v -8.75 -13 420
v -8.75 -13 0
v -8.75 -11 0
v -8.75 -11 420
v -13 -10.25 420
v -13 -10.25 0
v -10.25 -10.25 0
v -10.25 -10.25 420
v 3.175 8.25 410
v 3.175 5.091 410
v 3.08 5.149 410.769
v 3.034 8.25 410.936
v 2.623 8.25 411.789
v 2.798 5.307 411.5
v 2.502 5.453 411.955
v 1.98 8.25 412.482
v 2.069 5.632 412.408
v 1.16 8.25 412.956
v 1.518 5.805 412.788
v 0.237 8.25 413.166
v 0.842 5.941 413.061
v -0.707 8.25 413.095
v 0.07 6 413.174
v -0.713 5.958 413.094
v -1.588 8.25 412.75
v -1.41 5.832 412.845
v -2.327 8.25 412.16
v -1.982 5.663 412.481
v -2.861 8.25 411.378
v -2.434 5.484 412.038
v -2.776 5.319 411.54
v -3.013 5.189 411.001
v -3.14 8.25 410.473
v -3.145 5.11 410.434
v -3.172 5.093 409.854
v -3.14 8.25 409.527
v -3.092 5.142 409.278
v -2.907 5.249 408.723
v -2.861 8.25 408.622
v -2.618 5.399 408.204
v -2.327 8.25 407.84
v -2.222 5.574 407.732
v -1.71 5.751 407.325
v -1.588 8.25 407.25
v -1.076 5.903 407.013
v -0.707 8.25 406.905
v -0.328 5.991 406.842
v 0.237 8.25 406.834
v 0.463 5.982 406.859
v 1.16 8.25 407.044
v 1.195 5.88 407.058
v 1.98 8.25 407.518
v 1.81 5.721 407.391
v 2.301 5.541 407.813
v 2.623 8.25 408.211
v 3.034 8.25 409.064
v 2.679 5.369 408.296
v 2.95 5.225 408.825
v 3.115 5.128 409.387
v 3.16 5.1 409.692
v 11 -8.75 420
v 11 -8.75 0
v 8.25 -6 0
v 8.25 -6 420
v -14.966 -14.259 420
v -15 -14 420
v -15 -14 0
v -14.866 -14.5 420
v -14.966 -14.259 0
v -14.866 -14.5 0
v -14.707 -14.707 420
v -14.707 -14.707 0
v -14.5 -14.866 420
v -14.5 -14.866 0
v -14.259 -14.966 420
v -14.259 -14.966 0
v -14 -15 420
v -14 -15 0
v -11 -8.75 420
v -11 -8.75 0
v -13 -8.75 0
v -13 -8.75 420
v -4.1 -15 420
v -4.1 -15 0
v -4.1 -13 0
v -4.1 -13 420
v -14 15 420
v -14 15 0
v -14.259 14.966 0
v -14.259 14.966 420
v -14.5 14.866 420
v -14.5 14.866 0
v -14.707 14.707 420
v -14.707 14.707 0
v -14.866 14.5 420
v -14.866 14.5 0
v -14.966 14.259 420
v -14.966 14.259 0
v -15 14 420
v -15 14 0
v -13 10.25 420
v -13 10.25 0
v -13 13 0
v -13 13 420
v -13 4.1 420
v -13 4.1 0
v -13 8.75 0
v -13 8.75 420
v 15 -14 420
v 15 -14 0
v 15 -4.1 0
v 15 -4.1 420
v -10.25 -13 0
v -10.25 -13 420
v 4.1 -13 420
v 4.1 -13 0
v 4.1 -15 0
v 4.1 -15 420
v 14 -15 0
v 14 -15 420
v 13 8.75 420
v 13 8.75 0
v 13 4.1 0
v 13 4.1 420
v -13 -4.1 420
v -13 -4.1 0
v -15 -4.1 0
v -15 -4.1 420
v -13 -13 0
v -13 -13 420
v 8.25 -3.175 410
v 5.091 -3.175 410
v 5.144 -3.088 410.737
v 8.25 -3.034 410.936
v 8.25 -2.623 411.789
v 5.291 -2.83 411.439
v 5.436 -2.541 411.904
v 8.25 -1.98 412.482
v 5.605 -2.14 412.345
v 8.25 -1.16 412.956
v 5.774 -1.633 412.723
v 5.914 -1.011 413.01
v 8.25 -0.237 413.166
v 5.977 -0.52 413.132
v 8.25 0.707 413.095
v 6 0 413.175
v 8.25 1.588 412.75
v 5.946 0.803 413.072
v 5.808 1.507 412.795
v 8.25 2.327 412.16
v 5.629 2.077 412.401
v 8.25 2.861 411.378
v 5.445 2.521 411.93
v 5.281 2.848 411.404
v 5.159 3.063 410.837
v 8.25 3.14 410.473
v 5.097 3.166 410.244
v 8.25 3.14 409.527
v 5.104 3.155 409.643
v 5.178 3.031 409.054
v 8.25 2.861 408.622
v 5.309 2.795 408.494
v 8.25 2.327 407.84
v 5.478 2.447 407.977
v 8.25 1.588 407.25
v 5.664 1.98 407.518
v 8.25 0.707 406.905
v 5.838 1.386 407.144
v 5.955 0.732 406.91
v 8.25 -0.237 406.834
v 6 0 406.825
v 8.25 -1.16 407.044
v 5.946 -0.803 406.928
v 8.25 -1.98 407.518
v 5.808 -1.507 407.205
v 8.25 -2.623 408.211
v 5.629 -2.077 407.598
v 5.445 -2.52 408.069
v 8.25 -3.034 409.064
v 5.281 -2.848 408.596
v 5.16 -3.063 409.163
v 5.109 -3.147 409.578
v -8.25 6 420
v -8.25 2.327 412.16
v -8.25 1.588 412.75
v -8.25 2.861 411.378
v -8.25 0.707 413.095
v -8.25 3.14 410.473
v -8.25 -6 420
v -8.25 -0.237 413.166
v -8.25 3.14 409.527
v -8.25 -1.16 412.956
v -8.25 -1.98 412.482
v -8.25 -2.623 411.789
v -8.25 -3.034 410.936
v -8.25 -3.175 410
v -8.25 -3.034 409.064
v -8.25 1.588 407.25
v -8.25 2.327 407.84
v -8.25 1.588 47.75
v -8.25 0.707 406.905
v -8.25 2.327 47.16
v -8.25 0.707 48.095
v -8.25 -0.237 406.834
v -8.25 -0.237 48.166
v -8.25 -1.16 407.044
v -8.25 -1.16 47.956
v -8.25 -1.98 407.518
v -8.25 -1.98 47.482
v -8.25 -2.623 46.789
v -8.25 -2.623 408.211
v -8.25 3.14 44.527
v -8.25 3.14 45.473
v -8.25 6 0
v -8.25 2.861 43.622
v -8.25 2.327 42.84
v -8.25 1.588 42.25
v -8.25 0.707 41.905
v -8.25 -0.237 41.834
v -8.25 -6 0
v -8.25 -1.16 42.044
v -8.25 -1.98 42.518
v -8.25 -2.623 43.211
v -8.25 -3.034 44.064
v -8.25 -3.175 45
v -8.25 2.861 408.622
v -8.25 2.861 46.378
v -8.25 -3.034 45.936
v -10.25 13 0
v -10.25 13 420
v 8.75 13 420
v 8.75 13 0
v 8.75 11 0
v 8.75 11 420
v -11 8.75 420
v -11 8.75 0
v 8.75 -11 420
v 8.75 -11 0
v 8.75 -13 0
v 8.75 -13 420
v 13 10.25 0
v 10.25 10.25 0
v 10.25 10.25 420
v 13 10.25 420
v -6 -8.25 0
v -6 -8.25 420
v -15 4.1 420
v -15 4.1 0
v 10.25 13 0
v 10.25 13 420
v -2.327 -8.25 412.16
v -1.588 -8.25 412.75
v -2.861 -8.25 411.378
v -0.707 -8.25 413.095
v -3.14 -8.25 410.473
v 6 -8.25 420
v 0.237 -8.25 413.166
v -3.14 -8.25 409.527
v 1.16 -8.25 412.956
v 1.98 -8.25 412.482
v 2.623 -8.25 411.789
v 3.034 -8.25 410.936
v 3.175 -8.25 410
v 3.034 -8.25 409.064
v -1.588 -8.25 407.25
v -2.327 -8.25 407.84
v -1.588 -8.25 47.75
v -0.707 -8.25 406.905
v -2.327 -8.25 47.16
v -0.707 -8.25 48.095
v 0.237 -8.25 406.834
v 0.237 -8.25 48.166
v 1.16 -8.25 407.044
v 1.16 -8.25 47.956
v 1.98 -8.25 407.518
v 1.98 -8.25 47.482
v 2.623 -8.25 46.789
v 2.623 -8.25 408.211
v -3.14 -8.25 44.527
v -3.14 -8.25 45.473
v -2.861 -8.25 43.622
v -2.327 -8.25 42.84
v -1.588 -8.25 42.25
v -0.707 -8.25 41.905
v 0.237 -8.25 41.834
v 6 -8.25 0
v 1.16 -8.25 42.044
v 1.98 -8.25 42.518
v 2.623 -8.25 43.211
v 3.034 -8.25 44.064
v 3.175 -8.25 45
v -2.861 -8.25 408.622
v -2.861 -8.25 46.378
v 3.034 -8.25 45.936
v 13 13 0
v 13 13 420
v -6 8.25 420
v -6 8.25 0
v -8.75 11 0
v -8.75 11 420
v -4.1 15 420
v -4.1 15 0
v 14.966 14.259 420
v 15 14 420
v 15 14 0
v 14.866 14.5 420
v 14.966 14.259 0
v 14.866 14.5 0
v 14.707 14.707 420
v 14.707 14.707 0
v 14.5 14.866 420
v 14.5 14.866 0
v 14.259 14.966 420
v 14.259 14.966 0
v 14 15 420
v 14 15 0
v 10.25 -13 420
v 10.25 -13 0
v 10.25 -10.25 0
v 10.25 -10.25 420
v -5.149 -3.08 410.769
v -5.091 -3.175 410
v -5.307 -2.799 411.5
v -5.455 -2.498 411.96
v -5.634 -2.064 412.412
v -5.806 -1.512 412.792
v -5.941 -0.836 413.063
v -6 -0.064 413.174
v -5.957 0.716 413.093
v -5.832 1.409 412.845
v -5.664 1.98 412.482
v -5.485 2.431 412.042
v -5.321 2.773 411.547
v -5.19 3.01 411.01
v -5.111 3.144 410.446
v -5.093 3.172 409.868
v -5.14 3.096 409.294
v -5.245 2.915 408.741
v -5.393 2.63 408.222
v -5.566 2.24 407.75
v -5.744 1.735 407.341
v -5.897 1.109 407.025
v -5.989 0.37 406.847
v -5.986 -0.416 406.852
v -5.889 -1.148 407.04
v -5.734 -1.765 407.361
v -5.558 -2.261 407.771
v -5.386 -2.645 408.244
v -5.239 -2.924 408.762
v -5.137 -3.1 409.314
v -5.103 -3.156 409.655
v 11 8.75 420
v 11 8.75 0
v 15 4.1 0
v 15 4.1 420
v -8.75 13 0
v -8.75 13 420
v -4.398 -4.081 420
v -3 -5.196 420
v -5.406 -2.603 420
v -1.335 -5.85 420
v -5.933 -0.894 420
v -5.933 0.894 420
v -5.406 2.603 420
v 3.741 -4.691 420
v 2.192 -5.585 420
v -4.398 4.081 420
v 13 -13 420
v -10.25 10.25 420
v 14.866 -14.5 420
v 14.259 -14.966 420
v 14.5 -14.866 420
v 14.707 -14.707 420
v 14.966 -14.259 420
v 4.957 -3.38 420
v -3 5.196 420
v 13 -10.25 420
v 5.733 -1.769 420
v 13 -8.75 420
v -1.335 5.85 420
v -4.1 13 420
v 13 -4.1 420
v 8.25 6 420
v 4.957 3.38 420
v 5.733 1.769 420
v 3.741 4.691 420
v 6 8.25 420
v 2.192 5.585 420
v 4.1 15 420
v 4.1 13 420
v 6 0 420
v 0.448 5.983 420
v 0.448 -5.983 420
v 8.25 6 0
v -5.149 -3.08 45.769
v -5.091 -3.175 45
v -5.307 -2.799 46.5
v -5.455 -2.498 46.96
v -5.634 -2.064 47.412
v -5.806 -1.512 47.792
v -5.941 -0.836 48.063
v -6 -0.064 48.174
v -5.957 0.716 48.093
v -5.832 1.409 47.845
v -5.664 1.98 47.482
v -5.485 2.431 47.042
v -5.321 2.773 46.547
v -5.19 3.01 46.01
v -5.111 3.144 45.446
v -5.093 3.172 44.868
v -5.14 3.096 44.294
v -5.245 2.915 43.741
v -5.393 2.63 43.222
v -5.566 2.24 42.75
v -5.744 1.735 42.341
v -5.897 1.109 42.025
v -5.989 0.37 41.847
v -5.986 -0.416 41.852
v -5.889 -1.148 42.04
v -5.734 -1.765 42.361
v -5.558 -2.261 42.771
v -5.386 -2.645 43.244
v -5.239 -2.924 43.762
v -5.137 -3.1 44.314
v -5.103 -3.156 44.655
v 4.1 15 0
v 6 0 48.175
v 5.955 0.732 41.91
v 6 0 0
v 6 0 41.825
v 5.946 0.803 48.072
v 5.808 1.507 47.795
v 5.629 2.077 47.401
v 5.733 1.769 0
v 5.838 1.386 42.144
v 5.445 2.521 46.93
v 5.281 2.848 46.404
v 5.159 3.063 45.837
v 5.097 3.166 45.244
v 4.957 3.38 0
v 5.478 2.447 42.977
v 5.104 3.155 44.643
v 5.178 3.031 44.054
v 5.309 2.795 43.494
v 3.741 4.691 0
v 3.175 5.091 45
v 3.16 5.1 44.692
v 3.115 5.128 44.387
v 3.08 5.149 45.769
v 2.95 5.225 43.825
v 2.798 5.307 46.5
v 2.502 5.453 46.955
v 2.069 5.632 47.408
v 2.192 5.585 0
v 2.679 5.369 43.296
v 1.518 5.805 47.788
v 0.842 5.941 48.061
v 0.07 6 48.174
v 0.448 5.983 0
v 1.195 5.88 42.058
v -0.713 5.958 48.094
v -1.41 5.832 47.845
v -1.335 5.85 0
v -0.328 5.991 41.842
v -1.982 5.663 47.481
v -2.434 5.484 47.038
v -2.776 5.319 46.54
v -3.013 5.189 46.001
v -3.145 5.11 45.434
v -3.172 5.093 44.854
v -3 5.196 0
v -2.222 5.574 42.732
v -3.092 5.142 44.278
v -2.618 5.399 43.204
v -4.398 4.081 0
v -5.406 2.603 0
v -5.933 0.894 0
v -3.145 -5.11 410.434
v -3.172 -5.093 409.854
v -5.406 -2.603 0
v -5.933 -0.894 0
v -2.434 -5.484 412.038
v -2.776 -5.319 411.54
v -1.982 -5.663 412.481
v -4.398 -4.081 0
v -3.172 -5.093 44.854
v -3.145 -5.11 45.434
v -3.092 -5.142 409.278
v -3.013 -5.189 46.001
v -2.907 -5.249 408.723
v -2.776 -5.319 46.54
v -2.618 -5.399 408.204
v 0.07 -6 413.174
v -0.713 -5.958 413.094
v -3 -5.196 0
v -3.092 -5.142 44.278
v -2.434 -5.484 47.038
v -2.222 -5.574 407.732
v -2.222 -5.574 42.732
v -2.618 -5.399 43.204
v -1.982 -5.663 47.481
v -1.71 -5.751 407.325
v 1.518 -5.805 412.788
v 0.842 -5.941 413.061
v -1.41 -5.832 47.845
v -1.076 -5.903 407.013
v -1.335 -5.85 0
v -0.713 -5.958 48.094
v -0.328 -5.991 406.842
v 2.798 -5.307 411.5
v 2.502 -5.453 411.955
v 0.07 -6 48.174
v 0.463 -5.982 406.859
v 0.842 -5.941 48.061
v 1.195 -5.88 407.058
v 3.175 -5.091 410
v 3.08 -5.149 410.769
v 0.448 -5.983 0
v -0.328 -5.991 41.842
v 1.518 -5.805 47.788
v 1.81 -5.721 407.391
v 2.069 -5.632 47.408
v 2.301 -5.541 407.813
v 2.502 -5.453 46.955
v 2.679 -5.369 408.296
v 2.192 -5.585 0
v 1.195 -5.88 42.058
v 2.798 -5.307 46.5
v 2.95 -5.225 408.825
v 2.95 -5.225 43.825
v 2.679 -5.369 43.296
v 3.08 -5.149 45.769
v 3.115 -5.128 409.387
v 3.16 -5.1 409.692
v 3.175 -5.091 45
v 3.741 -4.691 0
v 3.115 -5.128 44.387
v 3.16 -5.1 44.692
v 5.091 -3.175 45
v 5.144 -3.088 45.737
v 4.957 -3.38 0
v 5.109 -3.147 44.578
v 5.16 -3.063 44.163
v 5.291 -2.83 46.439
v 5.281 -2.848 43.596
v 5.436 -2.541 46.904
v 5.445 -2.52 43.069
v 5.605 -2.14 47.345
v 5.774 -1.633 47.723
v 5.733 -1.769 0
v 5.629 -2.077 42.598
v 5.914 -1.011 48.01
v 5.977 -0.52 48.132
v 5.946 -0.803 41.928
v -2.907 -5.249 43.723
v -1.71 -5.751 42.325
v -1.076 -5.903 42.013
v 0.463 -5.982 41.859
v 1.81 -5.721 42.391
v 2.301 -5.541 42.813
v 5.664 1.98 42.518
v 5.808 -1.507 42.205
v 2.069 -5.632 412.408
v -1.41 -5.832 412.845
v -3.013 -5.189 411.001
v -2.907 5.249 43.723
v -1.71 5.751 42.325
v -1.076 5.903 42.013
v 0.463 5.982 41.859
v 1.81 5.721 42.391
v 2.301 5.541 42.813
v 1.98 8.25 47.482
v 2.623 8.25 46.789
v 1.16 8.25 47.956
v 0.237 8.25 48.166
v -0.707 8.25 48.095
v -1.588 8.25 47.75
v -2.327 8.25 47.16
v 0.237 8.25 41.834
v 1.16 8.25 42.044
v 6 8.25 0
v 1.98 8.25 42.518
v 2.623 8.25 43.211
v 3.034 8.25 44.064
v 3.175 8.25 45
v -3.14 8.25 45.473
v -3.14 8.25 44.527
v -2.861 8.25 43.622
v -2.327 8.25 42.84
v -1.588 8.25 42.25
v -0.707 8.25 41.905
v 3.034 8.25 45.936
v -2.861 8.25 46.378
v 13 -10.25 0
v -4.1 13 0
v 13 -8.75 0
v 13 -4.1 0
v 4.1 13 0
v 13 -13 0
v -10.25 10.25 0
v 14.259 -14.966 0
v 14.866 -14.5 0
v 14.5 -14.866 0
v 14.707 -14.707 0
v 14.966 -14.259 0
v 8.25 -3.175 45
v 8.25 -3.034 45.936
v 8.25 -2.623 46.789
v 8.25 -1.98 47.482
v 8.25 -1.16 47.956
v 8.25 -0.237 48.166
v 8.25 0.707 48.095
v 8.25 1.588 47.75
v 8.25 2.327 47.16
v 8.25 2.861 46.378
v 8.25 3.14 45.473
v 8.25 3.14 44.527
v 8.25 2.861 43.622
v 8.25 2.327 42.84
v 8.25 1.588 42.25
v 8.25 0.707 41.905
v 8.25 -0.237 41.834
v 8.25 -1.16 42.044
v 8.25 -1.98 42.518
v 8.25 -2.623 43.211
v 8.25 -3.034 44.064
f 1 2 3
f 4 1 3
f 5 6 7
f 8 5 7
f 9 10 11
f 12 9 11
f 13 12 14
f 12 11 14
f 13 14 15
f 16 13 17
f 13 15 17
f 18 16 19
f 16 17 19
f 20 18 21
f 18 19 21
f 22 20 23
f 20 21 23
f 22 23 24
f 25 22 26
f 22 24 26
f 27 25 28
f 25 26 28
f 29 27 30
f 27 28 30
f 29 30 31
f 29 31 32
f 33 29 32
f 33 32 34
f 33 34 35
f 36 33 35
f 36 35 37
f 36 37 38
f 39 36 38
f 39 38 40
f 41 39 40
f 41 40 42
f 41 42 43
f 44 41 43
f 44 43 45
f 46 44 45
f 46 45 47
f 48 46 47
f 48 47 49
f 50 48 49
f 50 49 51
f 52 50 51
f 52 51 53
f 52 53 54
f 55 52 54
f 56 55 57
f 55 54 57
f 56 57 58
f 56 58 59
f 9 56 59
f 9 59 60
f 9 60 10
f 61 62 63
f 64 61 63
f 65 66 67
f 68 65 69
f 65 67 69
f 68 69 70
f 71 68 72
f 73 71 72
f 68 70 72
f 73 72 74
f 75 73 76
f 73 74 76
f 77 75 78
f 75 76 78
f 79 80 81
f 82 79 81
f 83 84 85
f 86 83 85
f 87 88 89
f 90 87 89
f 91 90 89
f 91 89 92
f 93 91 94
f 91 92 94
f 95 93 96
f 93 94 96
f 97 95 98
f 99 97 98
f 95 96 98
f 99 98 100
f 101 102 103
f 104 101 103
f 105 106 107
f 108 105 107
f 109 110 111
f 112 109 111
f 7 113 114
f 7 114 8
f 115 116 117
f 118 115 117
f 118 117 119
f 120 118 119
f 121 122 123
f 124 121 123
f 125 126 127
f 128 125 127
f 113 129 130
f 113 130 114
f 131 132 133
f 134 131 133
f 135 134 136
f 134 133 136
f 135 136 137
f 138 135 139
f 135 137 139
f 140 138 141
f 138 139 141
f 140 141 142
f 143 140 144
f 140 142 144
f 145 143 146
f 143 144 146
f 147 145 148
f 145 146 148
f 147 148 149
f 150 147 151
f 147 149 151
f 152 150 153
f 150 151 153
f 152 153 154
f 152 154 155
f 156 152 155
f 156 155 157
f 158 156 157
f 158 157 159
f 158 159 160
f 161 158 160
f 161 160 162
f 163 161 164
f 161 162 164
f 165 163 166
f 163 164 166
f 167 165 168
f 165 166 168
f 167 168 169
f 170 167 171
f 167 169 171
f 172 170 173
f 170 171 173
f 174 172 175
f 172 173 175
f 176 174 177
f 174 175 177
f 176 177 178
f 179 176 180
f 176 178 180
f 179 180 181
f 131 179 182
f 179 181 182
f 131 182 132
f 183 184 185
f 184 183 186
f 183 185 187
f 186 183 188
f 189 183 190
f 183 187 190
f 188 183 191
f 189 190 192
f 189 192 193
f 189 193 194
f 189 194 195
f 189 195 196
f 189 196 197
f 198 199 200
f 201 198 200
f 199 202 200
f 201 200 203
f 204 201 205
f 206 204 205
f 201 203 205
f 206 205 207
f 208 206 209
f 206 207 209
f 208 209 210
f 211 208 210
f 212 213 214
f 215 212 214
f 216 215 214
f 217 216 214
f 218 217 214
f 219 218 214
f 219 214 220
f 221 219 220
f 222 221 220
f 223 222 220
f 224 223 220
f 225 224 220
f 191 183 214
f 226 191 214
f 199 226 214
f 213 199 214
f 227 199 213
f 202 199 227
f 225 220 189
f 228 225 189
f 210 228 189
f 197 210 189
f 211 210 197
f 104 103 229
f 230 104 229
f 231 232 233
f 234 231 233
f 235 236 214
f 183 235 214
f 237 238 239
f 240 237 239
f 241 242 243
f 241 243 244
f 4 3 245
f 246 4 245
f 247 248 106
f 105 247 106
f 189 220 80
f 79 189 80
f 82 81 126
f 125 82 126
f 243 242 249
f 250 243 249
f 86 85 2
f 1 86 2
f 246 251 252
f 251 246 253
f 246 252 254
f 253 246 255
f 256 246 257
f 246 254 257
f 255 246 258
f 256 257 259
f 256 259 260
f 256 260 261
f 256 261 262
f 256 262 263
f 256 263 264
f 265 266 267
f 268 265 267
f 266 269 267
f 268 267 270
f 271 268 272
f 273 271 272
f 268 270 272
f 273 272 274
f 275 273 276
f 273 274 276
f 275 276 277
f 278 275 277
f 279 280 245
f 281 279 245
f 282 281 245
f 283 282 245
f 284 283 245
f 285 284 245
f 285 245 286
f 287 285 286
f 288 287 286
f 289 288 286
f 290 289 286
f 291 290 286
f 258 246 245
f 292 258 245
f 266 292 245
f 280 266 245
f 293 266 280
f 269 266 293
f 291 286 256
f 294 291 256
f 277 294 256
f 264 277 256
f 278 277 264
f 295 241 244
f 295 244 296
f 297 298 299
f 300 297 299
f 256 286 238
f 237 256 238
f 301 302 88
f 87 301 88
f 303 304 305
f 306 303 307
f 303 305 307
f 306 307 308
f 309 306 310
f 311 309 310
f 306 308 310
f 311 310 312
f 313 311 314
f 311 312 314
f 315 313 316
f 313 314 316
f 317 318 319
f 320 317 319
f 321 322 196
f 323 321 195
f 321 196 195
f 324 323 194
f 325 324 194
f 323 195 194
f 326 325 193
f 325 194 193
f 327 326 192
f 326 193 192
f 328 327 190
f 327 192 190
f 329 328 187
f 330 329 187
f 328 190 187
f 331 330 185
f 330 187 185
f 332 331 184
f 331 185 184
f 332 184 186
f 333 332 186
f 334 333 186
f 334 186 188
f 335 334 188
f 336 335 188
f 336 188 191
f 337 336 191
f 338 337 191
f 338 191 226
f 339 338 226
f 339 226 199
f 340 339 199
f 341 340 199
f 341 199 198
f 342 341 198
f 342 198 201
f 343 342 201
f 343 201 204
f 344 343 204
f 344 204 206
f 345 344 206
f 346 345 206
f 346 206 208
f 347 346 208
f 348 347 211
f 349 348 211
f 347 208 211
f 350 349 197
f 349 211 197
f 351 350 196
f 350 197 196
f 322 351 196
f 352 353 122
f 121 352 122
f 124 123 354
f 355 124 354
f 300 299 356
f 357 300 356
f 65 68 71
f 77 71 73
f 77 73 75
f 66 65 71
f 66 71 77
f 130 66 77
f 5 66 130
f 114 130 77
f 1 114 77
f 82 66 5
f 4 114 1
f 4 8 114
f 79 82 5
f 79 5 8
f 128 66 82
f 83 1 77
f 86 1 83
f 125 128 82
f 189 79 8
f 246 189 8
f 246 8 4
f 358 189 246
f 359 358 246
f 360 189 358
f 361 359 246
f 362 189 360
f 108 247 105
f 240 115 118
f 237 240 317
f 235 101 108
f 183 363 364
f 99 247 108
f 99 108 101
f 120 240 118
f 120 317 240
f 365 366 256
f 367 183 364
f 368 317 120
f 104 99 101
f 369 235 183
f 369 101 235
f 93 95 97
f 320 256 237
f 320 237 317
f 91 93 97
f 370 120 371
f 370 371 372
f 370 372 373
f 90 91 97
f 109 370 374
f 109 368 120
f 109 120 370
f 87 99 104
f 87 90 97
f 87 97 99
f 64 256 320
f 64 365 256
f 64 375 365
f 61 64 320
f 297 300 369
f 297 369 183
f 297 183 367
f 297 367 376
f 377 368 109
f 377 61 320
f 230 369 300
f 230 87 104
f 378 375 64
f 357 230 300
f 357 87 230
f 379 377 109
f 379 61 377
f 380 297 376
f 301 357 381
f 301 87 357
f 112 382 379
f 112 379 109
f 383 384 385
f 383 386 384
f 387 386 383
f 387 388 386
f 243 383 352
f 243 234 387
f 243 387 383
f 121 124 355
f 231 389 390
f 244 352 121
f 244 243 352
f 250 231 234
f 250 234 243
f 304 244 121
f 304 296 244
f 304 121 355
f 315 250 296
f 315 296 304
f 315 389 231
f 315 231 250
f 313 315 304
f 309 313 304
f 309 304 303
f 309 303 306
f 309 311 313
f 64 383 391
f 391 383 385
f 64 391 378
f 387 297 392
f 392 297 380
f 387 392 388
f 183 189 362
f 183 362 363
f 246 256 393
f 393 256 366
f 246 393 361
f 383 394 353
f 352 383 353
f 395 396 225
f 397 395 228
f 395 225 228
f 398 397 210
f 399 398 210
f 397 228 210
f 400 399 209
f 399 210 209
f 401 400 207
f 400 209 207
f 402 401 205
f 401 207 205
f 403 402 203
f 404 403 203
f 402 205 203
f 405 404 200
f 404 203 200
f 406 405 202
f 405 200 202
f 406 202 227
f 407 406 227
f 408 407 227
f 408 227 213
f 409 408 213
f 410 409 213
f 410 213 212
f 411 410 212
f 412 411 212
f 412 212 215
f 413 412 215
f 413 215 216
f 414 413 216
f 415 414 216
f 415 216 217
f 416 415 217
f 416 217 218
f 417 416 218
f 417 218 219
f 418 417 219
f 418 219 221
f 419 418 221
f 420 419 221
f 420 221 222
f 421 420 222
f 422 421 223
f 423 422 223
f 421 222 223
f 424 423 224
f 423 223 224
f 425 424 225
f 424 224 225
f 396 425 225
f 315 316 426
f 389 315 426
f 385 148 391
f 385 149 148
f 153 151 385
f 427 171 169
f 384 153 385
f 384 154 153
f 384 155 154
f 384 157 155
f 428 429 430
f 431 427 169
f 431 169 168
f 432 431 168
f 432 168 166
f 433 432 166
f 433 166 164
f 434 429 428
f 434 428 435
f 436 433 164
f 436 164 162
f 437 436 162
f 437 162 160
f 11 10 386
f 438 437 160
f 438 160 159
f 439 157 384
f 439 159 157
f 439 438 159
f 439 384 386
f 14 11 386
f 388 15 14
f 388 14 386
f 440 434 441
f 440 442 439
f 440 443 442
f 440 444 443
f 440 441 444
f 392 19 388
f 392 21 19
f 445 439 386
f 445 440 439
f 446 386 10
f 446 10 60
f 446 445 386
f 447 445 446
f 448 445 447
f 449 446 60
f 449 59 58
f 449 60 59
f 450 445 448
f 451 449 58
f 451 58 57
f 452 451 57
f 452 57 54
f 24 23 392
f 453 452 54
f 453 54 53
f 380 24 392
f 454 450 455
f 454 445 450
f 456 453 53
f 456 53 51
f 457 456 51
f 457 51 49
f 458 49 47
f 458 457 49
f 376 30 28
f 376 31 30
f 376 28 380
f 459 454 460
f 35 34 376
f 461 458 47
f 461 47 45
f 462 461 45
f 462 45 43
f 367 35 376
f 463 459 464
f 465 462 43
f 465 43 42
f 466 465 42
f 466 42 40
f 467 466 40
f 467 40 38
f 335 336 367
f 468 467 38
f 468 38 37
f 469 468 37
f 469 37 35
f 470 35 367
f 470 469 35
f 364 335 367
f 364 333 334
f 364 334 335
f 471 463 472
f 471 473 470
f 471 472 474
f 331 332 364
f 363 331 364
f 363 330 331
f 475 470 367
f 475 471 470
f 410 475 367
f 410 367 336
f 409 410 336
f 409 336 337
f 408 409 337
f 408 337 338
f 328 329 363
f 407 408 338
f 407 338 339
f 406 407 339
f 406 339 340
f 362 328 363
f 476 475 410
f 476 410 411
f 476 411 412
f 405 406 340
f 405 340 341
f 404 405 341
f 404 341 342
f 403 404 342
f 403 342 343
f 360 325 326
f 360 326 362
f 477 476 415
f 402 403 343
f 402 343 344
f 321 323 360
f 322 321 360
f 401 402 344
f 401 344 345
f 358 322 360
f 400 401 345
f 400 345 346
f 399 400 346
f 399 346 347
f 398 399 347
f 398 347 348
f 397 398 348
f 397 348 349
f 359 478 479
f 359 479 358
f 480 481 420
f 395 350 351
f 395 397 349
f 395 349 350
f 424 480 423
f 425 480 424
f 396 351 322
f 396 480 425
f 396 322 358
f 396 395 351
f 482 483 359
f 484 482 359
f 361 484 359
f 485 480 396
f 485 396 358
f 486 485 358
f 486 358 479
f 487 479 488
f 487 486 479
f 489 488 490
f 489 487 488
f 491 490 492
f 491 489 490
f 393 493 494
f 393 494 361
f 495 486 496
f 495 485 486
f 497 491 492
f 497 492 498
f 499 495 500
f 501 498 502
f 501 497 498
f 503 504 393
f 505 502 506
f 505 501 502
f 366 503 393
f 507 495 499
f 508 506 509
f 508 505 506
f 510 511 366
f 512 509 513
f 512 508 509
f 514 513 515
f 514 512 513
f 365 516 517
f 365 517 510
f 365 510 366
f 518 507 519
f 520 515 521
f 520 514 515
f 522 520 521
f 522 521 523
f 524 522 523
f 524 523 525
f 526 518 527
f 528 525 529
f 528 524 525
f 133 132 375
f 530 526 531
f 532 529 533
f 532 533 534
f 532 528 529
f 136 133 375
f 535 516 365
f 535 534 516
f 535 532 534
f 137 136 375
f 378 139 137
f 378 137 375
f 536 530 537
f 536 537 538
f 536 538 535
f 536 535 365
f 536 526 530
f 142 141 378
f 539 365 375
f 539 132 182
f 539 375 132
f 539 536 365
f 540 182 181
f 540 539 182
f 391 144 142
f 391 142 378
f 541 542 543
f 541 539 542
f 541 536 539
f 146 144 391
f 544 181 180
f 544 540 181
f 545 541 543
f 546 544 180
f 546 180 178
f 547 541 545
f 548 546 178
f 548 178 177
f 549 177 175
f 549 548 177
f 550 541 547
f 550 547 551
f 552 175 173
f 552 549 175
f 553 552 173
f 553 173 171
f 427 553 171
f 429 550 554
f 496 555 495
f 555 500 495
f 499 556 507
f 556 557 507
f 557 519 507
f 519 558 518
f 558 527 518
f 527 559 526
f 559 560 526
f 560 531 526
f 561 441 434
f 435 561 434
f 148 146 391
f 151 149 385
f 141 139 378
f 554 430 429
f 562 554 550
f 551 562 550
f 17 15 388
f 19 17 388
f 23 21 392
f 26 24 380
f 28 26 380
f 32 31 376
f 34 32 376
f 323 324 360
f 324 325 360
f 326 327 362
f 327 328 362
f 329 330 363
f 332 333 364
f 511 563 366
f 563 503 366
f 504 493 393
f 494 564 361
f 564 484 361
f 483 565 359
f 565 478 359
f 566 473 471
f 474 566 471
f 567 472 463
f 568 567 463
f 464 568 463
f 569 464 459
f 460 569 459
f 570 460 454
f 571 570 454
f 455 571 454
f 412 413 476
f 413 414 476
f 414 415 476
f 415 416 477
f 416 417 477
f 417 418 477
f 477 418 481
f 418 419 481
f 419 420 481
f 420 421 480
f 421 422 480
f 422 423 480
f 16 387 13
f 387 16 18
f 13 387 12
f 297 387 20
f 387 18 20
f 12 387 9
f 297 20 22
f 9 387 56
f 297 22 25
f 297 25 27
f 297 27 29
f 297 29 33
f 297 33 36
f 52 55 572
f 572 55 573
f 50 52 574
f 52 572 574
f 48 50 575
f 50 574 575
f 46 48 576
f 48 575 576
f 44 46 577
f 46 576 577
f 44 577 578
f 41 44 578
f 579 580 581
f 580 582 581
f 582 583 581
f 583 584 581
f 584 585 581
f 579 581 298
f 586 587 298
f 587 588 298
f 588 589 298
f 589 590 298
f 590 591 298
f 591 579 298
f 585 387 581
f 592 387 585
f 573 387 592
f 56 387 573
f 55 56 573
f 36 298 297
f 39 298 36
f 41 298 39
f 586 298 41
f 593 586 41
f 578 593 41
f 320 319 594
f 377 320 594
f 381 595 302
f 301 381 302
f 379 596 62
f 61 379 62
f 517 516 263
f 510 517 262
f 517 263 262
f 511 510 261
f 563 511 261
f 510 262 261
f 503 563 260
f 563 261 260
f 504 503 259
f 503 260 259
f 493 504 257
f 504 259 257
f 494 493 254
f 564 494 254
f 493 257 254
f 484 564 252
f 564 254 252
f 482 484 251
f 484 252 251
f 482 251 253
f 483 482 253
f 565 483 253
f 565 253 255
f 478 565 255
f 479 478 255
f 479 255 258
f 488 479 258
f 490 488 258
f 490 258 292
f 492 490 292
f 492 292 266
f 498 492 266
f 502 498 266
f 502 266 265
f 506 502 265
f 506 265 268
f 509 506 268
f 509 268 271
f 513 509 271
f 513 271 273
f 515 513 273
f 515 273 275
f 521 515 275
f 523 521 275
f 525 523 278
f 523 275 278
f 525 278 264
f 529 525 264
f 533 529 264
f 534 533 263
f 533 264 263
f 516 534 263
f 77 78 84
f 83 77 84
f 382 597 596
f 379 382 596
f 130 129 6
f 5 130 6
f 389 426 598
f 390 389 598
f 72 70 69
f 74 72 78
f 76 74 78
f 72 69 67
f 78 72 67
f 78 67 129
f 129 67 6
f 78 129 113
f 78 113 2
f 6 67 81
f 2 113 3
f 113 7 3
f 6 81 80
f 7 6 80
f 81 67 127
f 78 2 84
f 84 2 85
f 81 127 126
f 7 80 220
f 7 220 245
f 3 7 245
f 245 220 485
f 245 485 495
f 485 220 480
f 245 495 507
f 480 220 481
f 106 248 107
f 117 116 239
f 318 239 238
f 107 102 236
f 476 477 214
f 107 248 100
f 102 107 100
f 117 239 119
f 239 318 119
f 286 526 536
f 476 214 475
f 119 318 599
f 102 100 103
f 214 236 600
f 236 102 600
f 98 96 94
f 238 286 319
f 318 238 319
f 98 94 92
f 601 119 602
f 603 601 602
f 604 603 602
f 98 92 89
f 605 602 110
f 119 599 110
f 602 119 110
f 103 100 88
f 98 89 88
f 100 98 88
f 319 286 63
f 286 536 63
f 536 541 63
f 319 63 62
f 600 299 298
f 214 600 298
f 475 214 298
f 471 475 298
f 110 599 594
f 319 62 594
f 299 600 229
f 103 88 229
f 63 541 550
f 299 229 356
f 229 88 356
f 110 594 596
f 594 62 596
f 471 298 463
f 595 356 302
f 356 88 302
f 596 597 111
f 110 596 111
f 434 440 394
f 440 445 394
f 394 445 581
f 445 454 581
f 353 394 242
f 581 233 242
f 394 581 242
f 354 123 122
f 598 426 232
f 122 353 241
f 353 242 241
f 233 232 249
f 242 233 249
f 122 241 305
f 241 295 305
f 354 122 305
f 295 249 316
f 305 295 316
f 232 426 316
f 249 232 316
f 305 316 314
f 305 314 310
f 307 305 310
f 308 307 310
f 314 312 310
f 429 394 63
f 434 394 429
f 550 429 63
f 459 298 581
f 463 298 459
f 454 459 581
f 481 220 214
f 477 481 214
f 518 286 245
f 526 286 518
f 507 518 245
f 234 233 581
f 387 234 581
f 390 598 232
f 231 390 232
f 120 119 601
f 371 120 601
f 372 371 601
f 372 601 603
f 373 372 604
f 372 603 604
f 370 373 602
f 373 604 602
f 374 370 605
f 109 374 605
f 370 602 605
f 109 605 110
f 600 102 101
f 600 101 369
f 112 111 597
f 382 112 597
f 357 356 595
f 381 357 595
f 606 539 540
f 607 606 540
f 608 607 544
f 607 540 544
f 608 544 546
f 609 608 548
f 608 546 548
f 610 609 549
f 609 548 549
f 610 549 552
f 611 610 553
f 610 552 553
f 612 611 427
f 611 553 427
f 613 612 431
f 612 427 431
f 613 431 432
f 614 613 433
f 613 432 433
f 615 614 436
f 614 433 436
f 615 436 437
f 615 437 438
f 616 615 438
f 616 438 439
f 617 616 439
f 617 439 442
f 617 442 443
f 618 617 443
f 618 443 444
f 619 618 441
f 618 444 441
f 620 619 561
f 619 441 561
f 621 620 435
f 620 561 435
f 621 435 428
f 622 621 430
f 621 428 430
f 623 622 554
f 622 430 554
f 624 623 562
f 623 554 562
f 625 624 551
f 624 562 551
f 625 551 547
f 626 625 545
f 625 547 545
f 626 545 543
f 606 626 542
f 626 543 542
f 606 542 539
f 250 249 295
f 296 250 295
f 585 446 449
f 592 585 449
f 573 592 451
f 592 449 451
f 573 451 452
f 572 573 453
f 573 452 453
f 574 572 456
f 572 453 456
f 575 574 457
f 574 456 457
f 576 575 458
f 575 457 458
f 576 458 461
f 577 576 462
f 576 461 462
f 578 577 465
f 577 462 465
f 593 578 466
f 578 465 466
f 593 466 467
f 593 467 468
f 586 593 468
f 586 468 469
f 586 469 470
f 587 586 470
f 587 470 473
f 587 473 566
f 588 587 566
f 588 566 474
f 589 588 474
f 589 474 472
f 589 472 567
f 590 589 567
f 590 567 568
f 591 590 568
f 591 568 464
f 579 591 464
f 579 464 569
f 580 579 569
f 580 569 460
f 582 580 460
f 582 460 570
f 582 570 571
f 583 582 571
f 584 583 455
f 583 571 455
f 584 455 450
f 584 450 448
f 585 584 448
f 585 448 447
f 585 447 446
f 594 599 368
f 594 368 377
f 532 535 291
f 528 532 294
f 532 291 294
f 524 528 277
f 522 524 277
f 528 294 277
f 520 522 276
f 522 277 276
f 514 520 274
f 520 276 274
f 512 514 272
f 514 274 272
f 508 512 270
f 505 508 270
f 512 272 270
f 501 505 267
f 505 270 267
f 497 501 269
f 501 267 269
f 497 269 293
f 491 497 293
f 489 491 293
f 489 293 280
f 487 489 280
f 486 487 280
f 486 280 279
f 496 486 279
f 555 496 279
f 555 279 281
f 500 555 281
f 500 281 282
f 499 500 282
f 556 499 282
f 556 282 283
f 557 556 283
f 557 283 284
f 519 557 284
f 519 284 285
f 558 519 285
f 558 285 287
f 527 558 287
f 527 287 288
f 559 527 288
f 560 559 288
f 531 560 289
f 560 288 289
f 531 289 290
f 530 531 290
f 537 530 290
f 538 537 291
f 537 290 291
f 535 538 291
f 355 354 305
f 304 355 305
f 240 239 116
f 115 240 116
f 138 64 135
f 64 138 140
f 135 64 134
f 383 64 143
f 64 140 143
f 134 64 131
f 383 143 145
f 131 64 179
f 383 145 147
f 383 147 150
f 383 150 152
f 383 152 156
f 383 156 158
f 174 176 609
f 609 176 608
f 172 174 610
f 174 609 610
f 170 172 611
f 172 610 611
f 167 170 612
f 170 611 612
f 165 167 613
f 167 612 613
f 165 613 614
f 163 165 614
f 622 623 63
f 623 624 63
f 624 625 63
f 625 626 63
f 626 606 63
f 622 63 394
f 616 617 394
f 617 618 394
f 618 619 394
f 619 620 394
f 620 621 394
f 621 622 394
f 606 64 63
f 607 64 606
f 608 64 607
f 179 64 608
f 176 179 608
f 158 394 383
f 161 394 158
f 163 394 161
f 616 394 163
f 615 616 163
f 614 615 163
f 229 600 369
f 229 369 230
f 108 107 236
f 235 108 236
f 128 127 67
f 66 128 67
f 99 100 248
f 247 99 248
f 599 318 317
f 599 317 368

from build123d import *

# Parameters (mm, degrees)
SKETCH006_R     = 6
SKETCH006_W     = 2.75
SKETCH006_H     = 2.75
PAD_DEPTH       = 420
SKETCH_R        = 3.175
POCKET_DEPTH    = 23.250999
SKETCH007_R     = 3.175
POCKET001_DEPTH = 23.251


with BuildPart() as part:
    # Sketch006 → Pad (new body)
    with BuildSketch(Plane.XY):
        with BuildLine():
            Line((4.1, -15), (14, -15))
            ThreePointArc((14, -15), (14.707107, -14.707107), (15, -14))
            Line((15, -14), (15, -4.1))
            Line((15, -4.1), (13, -4.1))
            Line((13, -4.1), (13, -8.75))
            Line((13, -8.75), (11, -8.75))
            Line((11, -8.75), (8.249999, -6))
            Line((8.249999, -6), (8.249999, 6))
            Line((8.249999, 6), (11, 8.75))
            Line((11, 8.75), (13, 8.75))
            Line((13, 8.75), (13, 4.1))
            Line((13, 4.1), (15, 4.1))
            Line((15, 4.1), (15, 14))
            ThreePointArc((15, 14), (14.707107, 14.707107), (14.000001, 15))
            Line((14.000001, 15), (4.1, 15))
            Line((4.1, 15), (4.1, 13))
            Line((4.1, 13), (8.75, 13))
            Line((8.75, 13), (8.75, 11))
            Line((8.75, 11), (6, 8.25))
            Line((6, 8.25), (-6, 8.25))
            Line((-6, 8.25), (-8.75, 11))
            Line((-8.75, 11), (-8.75, 13))
            Line((-8.75, 13), (-4.1, 13))
            Line((-4.1, 13), (-4.1, 15))
            Line((-4.1, 15), (-14, 15))
            ThreePointArc((-14, 15), (-14.707107, 14.707107), (-15, 14))
            Line((-15, 14), (-15, 4.1))
            Line((-15, 4.1), (-13, 4.1))
            Line((-13, 4.1), (-13, 8.75))
            Line((-13, 8.75), (-11, 8.75))
            Line((-11, 8.75), (-8.25, 6))
            Line((-8.25, 6), (-8.25, -6))
            Line((-8.25, -6), (-11, -8.75))
            Line((-11, -8.75), (-13, -8.75))
            Line((-13, -8.75), (-13, -4.1))
            Line((-13, -4.1), (-15, -4.1))
            Line((-15, -4.1), (-15, -14))
            ThreePointArc((-15, -14), (-14.707107, -14.707107), (-14.000001, -15))
            Line((-14.000001, -15), (-4.1, -15))
            Line((-4.1, -15), (-4.1, -13))
            Line((-4.1, -13), (-8.75, -13))
            Line((-8.75, -13), (-8.75, -11))
            Line((-8.75, -11), (-6, -8.249999))
            Line((-6, -8.249999), (6, -8.249999))
            Line((6, -8.249999), (8.75, -11))
            Line((8.75, -11), (8.75, -13))
            Line((8.75, -13), (4.1, -13))
            Line((4.1, -13), (4.1, -15))
        make_face()
        Circle(SKETCH006_R, mode=Mode.SUBTRACT)
        with Locations((-11.625, -11.625)):
            Rectangle(SKETCH006_W, SKETCH006_H, mode=Mode.SUBTRACT)
        with Locations((11.625, -11.625)):
            Rectangle(SKETCH006_W, SKETCH006_H, mode=Mode.SUBTRACT)
        with Locations((11.625, 11.625)):
            Rectangle(SKETCH006_W, SKETCH006_H, mode=Mode.SUBTRACT)
        with Locations((-11.625, 11.625)):
            Rectangle(SKETCH006_W, SKETCH006_H, mode=Mode.SUBTRACT)
    extrude(amount=PAD_DEPTH)

    # Sketch (on Face44 of Pad) → Pocket (cut, through all)
    with BuildSketch(Plane.XZ.offset(8.249999)):
        with Locations((0, 45)):
            Circle(SKETCH_R)
        with Locations((0, 410)):
            Circle(SKETCH_R)
    extrude(amount=-POCKET_DEPTH, mode=Mode.SUBTRACT)

    # Sketch007 (on Face36 of Pocket) → Pocket001 (cut, through all)
    with BuildSketch(Plane(origin=(-8.25, 0, 0), x_dir=(0, -1, 0), z_dir=(-1, 0, 0))):
        with Locations((0, 45)):
            Circle(SKETCH007_R)
        with Locations((0, 410)):
            Circle(SKETCH007_R)
    extrude(amount=-POCKET001_DEPTH, mode=Mode.SUBTRACT)


solid = part.part
